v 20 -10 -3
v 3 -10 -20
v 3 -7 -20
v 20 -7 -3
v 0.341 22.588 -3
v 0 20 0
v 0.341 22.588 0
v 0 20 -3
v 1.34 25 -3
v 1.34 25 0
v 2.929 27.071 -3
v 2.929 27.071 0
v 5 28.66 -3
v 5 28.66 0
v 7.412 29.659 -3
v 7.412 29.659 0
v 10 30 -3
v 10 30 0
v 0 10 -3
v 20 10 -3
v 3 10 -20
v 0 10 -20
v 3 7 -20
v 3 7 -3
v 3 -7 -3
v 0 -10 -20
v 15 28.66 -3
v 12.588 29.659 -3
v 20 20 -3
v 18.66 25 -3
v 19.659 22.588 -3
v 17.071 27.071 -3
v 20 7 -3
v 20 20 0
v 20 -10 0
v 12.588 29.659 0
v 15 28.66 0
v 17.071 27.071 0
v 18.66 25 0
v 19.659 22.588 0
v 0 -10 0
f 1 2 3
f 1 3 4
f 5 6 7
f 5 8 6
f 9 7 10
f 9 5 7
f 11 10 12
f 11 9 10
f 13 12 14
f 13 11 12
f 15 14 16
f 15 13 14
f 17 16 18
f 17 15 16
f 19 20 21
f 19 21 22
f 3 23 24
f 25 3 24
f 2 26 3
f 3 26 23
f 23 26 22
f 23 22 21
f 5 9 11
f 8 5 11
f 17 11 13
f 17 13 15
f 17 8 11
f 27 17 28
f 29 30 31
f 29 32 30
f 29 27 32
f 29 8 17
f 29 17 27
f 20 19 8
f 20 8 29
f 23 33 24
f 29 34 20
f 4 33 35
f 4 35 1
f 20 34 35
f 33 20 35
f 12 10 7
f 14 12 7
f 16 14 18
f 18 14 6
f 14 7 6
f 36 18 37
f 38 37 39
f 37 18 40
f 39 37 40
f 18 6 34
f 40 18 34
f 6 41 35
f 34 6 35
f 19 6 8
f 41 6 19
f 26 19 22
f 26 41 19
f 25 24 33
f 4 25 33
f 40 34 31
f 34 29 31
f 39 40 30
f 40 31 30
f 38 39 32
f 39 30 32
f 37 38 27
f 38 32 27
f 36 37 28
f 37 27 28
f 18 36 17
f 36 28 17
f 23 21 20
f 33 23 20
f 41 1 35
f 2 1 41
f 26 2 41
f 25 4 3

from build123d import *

# Parameters (mm, degrees)
EXTRUDE_1_DEPTH = 10
EXTRUDE_START   = -10
EXTRUDE_2_DEPTH = 3
SKETCH_2_W      = 20
SKETCH_2_H      = 3
EXTRUDE_3_DEPTH = 20
FILLET_1_R      = 10


with BuildPart() as part:
    # Эскиз1 → Бобышка-Вытянуть1 (new, symmetric)
    with BuildSketch(Plane(origin=(0, 0, 0), x_dir=(1, 0, 0), z_dir=(0, 1, 0))):
        Polygon((20, 0), (0, 0), (0, 20), (3, 20), (3, 3), (20, 3), align=None)
    extrude(amount=EXTRUDE_1_DEPTH, both=True)

    # Эскиз1<3> → Бобышка-Вытянуть2 (add)
    with BuildSketch(Plane(origin=(0, 0, 0), x_dir=(1, 0, 0), z_dir=(0, 1, 0)).offset(EXTRUDE_START)):
        Polygon((3, 20), (20, 3), (3, 3), align=None)
    extrude_2 = extrude(amount=EXTRUDE_2_DEPTH)

    # Зеркальное отражение2: Бобышка-Вытянуть2 across plane
    add(extrude_2.mirror(Plane.ZX))

    # Эскиз2 → Бобышка-Вытянуть3 (add)
    with BuildSketch(Plane(origin=(0, 10, 0), x_dir=(1, 0, 0), z_dir=(0, 1, 0))):
        with Locations((10, 1.5)):
            Rectangle(SKETCH_2_W, SKETCH_2_H)
    extrude(amount=EXTRUDE_3_DEPTH)

    # Скругление1
    fillet_1_edges = [part.edges().sort_by_distance(p)[0] for p in [
        (0, 30, -1.5),
        (20, 30, -1.5),
    ]]
    fillet(fillet_1_edges, radius=FILLET_1_R - 0.0001)  # a hair under: the kernel refuses the full size


solid = part.part
